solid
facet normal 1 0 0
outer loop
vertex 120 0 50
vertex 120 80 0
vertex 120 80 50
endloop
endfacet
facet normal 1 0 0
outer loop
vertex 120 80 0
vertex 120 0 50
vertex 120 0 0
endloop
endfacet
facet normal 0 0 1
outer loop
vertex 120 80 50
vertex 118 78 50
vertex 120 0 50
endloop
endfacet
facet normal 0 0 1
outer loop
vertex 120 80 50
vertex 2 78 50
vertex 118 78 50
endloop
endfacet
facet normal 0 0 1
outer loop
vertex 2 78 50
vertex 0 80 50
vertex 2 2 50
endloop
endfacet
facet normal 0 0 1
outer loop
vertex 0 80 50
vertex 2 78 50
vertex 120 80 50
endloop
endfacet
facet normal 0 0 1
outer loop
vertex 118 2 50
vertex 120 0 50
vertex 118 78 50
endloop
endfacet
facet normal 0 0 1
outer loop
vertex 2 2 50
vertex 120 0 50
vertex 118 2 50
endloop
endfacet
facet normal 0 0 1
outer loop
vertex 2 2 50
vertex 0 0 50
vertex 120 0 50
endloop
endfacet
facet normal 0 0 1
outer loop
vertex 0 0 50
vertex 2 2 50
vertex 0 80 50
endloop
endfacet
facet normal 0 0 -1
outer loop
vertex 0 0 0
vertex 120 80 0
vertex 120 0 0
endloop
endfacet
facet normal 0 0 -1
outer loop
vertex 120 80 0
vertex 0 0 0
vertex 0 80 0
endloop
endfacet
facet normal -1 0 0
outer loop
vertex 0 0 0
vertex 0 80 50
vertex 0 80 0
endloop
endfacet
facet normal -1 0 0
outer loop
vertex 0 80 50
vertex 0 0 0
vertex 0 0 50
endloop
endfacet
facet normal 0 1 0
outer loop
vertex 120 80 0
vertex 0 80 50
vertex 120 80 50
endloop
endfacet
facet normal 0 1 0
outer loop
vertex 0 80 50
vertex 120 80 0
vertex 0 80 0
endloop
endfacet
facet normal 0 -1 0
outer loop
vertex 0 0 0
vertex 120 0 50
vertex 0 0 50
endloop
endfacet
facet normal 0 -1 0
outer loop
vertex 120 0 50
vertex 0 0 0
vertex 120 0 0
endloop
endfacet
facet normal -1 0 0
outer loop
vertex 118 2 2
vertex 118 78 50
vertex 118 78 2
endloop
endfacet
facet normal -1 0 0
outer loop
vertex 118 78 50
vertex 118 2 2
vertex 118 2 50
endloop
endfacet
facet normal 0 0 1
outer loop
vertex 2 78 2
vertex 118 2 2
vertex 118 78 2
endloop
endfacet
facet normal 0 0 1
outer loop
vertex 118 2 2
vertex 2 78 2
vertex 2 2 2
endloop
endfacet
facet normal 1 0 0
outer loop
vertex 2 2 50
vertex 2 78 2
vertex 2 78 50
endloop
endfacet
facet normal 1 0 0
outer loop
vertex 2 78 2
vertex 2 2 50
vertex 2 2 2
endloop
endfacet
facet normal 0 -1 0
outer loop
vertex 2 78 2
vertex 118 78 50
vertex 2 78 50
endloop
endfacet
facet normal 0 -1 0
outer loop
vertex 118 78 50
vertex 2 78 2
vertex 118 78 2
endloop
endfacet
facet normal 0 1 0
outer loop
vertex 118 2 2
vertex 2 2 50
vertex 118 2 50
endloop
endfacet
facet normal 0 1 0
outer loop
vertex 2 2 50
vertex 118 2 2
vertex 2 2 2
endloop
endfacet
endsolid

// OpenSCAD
// Generated by models/levi/src/levi.py
// Units: millimeters
outer_length = 120;
outer_width = 80;
outer_height = 50;
wall_thickness = 2;
cut_epsilon = 0.01;

module levi_box() {
  difference() {
    cube([outer_length, outer_width, outer_height], center = false);
    translate([wall_thickness, wall_thickness, wall_thickness])
      cube([
        outer_length - wall_thickness * 2,
        outer_width - wall_thickness * 2,
        outer_height - wall_thickness + cut_epsilon
      ], center = false);
  }
}

levi_box();
